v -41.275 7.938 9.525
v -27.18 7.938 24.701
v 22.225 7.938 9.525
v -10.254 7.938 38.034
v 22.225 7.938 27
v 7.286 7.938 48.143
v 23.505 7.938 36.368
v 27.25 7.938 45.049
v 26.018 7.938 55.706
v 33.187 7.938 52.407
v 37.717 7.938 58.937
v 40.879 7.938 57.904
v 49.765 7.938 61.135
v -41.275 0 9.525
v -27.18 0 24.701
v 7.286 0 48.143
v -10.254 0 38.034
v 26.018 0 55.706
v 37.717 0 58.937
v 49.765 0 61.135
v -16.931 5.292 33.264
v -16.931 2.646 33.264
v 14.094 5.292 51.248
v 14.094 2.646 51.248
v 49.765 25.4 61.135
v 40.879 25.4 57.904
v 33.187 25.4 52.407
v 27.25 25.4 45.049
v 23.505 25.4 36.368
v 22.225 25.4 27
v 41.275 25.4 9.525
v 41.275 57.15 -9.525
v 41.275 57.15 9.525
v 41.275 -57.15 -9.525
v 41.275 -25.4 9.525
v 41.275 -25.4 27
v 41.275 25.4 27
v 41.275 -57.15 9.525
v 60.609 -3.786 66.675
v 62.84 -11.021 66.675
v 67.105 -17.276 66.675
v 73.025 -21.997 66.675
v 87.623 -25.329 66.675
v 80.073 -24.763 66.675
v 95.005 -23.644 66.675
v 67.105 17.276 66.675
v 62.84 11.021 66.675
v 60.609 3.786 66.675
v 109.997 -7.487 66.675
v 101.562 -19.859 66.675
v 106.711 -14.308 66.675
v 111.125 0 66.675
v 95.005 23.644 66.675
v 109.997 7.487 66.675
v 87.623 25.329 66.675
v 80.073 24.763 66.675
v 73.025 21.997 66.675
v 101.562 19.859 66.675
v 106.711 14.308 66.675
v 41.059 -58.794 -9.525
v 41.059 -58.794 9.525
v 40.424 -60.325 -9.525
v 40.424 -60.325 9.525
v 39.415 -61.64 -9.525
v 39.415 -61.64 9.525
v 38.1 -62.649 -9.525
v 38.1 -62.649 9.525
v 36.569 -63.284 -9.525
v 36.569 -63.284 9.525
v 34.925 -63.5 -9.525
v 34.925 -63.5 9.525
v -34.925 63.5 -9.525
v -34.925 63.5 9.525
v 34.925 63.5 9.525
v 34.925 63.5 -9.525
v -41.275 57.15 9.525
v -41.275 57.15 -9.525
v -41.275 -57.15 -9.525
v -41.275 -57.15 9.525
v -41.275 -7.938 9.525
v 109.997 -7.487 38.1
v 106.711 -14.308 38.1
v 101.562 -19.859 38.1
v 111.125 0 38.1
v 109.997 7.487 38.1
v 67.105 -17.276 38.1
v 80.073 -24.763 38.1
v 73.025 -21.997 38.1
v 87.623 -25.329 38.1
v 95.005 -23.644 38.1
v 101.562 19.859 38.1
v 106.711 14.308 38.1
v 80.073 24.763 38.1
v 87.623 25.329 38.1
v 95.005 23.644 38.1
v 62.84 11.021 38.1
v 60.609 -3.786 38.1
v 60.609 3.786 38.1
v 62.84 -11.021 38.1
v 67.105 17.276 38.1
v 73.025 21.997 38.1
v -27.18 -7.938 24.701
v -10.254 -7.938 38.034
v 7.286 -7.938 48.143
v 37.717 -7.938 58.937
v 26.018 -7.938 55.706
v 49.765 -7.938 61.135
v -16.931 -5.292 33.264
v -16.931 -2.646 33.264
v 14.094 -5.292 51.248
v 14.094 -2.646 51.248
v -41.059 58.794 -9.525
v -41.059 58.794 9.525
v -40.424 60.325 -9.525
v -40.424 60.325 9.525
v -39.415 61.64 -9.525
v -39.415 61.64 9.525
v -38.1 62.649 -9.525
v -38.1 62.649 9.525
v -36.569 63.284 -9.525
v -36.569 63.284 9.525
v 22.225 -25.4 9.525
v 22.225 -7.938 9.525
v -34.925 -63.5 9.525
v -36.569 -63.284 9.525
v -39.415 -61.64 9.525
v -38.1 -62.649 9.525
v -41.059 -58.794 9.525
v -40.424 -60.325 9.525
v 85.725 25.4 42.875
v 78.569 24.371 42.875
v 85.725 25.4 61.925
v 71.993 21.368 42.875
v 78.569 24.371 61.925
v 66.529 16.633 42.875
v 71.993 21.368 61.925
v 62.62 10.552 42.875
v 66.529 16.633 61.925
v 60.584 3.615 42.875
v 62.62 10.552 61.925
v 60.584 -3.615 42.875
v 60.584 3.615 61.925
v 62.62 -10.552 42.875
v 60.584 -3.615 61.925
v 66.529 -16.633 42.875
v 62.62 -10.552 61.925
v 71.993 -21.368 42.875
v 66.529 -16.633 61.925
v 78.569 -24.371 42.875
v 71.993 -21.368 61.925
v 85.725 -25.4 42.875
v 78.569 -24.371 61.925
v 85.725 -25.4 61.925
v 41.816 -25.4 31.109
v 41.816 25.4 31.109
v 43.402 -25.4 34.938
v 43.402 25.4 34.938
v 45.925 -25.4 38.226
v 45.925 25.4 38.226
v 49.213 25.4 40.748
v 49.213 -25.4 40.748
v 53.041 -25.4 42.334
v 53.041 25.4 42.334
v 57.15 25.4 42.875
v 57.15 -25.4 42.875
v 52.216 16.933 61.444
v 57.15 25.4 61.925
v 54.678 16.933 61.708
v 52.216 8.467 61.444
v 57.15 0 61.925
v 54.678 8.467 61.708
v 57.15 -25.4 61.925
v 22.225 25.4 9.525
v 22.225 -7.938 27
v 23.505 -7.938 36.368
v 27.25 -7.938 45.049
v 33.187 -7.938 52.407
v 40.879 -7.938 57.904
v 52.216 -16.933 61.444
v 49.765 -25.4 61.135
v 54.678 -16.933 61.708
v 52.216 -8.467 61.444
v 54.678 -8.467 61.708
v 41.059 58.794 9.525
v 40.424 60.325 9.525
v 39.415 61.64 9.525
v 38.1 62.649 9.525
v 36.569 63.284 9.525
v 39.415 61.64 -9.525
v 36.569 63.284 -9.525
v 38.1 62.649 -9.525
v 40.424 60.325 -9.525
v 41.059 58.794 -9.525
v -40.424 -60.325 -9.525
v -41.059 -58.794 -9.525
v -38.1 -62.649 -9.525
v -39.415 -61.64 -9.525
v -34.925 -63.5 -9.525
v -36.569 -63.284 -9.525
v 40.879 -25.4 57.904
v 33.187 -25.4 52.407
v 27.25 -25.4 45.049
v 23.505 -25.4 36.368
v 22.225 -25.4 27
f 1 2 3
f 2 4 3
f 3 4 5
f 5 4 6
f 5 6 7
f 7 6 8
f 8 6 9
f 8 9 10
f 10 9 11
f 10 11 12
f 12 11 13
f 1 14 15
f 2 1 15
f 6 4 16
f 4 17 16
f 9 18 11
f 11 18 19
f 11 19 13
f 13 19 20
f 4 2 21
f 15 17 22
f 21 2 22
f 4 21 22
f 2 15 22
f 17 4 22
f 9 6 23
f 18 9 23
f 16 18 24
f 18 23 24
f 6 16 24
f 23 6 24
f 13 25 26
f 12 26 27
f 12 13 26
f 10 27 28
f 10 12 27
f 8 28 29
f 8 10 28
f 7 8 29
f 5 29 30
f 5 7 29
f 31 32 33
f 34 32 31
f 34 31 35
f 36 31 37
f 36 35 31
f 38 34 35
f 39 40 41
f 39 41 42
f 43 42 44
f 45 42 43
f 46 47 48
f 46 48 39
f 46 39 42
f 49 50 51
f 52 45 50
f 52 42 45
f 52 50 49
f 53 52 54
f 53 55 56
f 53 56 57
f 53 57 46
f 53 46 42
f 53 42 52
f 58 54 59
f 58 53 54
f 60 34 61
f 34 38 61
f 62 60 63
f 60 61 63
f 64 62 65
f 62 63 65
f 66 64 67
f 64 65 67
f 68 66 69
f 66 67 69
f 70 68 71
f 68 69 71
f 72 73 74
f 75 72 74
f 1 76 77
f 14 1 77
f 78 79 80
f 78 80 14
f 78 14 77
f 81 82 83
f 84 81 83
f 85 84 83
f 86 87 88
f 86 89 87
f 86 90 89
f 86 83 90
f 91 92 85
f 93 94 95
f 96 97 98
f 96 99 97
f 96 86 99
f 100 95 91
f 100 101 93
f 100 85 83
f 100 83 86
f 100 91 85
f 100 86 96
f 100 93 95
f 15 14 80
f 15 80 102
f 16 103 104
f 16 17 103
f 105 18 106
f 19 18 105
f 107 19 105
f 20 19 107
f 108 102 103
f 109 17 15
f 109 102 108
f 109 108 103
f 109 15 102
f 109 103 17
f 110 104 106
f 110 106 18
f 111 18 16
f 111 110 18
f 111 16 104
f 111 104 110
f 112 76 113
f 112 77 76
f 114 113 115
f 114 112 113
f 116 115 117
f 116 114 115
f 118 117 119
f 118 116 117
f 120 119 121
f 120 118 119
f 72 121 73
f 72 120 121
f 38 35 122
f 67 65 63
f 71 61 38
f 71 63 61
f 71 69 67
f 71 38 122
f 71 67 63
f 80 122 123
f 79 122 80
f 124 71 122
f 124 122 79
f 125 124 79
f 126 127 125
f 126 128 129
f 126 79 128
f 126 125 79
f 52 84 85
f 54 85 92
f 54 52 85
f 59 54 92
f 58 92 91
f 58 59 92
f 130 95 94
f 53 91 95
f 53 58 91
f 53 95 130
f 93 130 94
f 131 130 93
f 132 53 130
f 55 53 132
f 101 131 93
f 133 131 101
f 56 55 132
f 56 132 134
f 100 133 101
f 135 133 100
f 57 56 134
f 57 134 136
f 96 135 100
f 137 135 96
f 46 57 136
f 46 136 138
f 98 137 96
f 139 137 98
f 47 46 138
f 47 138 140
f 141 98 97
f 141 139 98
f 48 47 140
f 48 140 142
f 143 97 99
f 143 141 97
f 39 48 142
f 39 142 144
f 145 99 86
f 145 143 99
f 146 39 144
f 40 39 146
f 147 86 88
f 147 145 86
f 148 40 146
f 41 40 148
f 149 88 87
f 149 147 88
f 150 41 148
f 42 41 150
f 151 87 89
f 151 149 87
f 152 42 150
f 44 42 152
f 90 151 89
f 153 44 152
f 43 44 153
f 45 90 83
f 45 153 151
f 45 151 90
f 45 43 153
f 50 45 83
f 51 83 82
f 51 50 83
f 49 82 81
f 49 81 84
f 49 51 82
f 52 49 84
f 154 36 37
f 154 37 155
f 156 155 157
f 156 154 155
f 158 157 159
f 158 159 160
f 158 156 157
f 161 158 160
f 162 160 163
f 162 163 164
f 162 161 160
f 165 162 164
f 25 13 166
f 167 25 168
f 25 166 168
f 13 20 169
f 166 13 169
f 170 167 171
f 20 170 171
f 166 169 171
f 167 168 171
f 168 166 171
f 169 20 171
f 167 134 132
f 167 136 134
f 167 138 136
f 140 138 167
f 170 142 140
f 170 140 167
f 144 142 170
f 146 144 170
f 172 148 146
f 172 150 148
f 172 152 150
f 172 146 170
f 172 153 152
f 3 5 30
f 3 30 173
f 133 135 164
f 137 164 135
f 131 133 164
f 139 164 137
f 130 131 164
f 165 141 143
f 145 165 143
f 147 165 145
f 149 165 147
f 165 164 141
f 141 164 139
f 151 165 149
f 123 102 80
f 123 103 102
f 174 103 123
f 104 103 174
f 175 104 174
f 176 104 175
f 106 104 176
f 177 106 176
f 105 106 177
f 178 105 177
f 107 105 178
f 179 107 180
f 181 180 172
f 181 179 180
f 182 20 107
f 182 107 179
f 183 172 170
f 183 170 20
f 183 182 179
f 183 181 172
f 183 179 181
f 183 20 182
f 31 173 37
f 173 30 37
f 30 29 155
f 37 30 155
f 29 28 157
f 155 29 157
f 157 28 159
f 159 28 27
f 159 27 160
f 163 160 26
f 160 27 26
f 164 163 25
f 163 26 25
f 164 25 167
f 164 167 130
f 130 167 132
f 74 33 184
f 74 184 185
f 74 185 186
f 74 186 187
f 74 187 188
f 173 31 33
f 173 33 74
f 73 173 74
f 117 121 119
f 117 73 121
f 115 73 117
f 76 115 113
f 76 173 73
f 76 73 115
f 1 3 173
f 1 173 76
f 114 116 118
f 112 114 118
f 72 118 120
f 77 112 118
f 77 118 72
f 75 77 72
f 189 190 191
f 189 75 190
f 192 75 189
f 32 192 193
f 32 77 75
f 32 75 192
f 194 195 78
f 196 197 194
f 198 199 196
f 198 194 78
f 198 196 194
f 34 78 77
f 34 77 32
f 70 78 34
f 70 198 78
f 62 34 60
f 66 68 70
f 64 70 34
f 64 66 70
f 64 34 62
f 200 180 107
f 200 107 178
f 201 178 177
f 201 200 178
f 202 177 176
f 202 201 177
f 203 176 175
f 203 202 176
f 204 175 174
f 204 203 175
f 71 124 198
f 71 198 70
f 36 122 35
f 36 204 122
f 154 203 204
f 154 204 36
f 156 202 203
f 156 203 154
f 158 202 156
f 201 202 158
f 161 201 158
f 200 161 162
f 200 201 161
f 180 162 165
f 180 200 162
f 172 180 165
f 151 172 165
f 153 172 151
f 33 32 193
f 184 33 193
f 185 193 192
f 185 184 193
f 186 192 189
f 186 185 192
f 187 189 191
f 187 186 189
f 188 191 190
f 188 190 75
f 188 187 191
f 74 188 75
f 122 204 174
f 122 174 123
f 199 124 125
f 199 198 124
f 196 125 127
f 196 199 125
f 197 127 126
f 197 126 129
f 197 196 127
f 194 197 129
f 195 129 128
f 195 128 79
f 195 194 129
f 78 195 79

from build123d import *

# Parameters (mm, degrees)
F1_DEPTH = 63.5
F0_W     = 25.4
F0_H     = 19.05
F2_DEPTH = 25.4
F3_DEPTH = 7.9375
F5_R     = 6.35


# Not quite as in the source:
# - a feature names something its author has since deleted; it is built from what else it names


with BuildPart() as f1:
    # F0 (on Front) → F1 (new body, symmetric)
    with BuildSketch(Plane.XZ):
        Polygon((41.275, -9.525), (41.275, 9.525), (22.225, 9.525), (-41.275, 9.525), (-41.275, -9.525), align=None)
    extrude(amount=F1_DEPTH, both=True)

    # F0 (on Front) → F2 (join, symmetric)
    with BuildSketch(Plane.XZ):
        with BuildLine():
            Line((22.225, 9.525), (41.275, 9.525))
            Line((41.275, 9.525), (41.275, 27.0002))
            ThreePointArc((41.275, 27.0002), (45.9246798487, 38.2255201513), (57.15, 42.8752))
            Line((57.15, 42.8752), (60.325, 42.8752))
            Line((60.325, 42.8752), (60.325, 61.9252))
            Line((60.325, 61.9252), (57.15, 61.9252))
            add(Edge.make_bspline(
                [(49.7646190409, 61.1353984481), (52.2104568014, 61.4669327128), (54.6731104701, 61.7311893911), (57.15, 61.9252)],
                knots=[104.645371818, 104.645371818, 104.645371818, 104.645371818, 111.5045361635, 111.5045361635, 111.5045361635, 111.5045361635], degree=3))
            ThreePointArc((49.7646190409, 61.1353984481), (29.9682960891, 48.9298739032), (22.225, 27.0002))
            Line((22.225, 27.0002), (22.225, 9.525))
        make_face()
        with Locations((73.025, 52.4002)):
            Rectangle(F0_W, F0_H)
    extrude(amount=F2_DEPTH, both=True)

    # F0 (on Front) → F3 (join, symmetric)
    with BuildSketch(Plane.XZ):
        with BuildLine():
            Line((-41.275, 9.525), (22.225, 9.525))
            Line((22.225, 9.525), (22.225, 27.0002))
            ThreePointArc((22.225, 27.0002), (29.9682960891, 48.9298739032), (49.7646190409, 61.1353984481))
            add(Edge.make_bspline(
                [(-41.275, 9.525), (-20.9502066659, 35.3602907495), (12.4502190704, 56.0774169419), (49.7646190409, 61.1353984481)],
                knots=[0, 0, 0, 0, 104.645371818, 104.645371818, 104.645371818, 104.645371818], degree=3))
        make_face()
    extrude(amount=F3_DEPTH, both=True)

    # F0 (on Front) → F4 (revolve)
    with BuildSketch(Plane.XZ):
        Polygon((85.725, 61.9252), (85.725, 42.8752), (85.725, 38.1), (111.125, 38.1), (111.125, 66.675), (85.725, 66.675), align=None)
    revolve(axis=Axis((85.725, 0, 52.3875), (0, 0, 1)))

    # F5
    f5_edges = [f1.edges().sort_by_distance(p)[0] for p in [
        (41.275, -63.5, 0),
        (41.275, 63.5, 0),
        (-41.275, 63.5, 0),
        (-41.275, -63.5, 0),
    ]]
    fillet(f5_edges, radius=F5_R)


solid = f1.part
